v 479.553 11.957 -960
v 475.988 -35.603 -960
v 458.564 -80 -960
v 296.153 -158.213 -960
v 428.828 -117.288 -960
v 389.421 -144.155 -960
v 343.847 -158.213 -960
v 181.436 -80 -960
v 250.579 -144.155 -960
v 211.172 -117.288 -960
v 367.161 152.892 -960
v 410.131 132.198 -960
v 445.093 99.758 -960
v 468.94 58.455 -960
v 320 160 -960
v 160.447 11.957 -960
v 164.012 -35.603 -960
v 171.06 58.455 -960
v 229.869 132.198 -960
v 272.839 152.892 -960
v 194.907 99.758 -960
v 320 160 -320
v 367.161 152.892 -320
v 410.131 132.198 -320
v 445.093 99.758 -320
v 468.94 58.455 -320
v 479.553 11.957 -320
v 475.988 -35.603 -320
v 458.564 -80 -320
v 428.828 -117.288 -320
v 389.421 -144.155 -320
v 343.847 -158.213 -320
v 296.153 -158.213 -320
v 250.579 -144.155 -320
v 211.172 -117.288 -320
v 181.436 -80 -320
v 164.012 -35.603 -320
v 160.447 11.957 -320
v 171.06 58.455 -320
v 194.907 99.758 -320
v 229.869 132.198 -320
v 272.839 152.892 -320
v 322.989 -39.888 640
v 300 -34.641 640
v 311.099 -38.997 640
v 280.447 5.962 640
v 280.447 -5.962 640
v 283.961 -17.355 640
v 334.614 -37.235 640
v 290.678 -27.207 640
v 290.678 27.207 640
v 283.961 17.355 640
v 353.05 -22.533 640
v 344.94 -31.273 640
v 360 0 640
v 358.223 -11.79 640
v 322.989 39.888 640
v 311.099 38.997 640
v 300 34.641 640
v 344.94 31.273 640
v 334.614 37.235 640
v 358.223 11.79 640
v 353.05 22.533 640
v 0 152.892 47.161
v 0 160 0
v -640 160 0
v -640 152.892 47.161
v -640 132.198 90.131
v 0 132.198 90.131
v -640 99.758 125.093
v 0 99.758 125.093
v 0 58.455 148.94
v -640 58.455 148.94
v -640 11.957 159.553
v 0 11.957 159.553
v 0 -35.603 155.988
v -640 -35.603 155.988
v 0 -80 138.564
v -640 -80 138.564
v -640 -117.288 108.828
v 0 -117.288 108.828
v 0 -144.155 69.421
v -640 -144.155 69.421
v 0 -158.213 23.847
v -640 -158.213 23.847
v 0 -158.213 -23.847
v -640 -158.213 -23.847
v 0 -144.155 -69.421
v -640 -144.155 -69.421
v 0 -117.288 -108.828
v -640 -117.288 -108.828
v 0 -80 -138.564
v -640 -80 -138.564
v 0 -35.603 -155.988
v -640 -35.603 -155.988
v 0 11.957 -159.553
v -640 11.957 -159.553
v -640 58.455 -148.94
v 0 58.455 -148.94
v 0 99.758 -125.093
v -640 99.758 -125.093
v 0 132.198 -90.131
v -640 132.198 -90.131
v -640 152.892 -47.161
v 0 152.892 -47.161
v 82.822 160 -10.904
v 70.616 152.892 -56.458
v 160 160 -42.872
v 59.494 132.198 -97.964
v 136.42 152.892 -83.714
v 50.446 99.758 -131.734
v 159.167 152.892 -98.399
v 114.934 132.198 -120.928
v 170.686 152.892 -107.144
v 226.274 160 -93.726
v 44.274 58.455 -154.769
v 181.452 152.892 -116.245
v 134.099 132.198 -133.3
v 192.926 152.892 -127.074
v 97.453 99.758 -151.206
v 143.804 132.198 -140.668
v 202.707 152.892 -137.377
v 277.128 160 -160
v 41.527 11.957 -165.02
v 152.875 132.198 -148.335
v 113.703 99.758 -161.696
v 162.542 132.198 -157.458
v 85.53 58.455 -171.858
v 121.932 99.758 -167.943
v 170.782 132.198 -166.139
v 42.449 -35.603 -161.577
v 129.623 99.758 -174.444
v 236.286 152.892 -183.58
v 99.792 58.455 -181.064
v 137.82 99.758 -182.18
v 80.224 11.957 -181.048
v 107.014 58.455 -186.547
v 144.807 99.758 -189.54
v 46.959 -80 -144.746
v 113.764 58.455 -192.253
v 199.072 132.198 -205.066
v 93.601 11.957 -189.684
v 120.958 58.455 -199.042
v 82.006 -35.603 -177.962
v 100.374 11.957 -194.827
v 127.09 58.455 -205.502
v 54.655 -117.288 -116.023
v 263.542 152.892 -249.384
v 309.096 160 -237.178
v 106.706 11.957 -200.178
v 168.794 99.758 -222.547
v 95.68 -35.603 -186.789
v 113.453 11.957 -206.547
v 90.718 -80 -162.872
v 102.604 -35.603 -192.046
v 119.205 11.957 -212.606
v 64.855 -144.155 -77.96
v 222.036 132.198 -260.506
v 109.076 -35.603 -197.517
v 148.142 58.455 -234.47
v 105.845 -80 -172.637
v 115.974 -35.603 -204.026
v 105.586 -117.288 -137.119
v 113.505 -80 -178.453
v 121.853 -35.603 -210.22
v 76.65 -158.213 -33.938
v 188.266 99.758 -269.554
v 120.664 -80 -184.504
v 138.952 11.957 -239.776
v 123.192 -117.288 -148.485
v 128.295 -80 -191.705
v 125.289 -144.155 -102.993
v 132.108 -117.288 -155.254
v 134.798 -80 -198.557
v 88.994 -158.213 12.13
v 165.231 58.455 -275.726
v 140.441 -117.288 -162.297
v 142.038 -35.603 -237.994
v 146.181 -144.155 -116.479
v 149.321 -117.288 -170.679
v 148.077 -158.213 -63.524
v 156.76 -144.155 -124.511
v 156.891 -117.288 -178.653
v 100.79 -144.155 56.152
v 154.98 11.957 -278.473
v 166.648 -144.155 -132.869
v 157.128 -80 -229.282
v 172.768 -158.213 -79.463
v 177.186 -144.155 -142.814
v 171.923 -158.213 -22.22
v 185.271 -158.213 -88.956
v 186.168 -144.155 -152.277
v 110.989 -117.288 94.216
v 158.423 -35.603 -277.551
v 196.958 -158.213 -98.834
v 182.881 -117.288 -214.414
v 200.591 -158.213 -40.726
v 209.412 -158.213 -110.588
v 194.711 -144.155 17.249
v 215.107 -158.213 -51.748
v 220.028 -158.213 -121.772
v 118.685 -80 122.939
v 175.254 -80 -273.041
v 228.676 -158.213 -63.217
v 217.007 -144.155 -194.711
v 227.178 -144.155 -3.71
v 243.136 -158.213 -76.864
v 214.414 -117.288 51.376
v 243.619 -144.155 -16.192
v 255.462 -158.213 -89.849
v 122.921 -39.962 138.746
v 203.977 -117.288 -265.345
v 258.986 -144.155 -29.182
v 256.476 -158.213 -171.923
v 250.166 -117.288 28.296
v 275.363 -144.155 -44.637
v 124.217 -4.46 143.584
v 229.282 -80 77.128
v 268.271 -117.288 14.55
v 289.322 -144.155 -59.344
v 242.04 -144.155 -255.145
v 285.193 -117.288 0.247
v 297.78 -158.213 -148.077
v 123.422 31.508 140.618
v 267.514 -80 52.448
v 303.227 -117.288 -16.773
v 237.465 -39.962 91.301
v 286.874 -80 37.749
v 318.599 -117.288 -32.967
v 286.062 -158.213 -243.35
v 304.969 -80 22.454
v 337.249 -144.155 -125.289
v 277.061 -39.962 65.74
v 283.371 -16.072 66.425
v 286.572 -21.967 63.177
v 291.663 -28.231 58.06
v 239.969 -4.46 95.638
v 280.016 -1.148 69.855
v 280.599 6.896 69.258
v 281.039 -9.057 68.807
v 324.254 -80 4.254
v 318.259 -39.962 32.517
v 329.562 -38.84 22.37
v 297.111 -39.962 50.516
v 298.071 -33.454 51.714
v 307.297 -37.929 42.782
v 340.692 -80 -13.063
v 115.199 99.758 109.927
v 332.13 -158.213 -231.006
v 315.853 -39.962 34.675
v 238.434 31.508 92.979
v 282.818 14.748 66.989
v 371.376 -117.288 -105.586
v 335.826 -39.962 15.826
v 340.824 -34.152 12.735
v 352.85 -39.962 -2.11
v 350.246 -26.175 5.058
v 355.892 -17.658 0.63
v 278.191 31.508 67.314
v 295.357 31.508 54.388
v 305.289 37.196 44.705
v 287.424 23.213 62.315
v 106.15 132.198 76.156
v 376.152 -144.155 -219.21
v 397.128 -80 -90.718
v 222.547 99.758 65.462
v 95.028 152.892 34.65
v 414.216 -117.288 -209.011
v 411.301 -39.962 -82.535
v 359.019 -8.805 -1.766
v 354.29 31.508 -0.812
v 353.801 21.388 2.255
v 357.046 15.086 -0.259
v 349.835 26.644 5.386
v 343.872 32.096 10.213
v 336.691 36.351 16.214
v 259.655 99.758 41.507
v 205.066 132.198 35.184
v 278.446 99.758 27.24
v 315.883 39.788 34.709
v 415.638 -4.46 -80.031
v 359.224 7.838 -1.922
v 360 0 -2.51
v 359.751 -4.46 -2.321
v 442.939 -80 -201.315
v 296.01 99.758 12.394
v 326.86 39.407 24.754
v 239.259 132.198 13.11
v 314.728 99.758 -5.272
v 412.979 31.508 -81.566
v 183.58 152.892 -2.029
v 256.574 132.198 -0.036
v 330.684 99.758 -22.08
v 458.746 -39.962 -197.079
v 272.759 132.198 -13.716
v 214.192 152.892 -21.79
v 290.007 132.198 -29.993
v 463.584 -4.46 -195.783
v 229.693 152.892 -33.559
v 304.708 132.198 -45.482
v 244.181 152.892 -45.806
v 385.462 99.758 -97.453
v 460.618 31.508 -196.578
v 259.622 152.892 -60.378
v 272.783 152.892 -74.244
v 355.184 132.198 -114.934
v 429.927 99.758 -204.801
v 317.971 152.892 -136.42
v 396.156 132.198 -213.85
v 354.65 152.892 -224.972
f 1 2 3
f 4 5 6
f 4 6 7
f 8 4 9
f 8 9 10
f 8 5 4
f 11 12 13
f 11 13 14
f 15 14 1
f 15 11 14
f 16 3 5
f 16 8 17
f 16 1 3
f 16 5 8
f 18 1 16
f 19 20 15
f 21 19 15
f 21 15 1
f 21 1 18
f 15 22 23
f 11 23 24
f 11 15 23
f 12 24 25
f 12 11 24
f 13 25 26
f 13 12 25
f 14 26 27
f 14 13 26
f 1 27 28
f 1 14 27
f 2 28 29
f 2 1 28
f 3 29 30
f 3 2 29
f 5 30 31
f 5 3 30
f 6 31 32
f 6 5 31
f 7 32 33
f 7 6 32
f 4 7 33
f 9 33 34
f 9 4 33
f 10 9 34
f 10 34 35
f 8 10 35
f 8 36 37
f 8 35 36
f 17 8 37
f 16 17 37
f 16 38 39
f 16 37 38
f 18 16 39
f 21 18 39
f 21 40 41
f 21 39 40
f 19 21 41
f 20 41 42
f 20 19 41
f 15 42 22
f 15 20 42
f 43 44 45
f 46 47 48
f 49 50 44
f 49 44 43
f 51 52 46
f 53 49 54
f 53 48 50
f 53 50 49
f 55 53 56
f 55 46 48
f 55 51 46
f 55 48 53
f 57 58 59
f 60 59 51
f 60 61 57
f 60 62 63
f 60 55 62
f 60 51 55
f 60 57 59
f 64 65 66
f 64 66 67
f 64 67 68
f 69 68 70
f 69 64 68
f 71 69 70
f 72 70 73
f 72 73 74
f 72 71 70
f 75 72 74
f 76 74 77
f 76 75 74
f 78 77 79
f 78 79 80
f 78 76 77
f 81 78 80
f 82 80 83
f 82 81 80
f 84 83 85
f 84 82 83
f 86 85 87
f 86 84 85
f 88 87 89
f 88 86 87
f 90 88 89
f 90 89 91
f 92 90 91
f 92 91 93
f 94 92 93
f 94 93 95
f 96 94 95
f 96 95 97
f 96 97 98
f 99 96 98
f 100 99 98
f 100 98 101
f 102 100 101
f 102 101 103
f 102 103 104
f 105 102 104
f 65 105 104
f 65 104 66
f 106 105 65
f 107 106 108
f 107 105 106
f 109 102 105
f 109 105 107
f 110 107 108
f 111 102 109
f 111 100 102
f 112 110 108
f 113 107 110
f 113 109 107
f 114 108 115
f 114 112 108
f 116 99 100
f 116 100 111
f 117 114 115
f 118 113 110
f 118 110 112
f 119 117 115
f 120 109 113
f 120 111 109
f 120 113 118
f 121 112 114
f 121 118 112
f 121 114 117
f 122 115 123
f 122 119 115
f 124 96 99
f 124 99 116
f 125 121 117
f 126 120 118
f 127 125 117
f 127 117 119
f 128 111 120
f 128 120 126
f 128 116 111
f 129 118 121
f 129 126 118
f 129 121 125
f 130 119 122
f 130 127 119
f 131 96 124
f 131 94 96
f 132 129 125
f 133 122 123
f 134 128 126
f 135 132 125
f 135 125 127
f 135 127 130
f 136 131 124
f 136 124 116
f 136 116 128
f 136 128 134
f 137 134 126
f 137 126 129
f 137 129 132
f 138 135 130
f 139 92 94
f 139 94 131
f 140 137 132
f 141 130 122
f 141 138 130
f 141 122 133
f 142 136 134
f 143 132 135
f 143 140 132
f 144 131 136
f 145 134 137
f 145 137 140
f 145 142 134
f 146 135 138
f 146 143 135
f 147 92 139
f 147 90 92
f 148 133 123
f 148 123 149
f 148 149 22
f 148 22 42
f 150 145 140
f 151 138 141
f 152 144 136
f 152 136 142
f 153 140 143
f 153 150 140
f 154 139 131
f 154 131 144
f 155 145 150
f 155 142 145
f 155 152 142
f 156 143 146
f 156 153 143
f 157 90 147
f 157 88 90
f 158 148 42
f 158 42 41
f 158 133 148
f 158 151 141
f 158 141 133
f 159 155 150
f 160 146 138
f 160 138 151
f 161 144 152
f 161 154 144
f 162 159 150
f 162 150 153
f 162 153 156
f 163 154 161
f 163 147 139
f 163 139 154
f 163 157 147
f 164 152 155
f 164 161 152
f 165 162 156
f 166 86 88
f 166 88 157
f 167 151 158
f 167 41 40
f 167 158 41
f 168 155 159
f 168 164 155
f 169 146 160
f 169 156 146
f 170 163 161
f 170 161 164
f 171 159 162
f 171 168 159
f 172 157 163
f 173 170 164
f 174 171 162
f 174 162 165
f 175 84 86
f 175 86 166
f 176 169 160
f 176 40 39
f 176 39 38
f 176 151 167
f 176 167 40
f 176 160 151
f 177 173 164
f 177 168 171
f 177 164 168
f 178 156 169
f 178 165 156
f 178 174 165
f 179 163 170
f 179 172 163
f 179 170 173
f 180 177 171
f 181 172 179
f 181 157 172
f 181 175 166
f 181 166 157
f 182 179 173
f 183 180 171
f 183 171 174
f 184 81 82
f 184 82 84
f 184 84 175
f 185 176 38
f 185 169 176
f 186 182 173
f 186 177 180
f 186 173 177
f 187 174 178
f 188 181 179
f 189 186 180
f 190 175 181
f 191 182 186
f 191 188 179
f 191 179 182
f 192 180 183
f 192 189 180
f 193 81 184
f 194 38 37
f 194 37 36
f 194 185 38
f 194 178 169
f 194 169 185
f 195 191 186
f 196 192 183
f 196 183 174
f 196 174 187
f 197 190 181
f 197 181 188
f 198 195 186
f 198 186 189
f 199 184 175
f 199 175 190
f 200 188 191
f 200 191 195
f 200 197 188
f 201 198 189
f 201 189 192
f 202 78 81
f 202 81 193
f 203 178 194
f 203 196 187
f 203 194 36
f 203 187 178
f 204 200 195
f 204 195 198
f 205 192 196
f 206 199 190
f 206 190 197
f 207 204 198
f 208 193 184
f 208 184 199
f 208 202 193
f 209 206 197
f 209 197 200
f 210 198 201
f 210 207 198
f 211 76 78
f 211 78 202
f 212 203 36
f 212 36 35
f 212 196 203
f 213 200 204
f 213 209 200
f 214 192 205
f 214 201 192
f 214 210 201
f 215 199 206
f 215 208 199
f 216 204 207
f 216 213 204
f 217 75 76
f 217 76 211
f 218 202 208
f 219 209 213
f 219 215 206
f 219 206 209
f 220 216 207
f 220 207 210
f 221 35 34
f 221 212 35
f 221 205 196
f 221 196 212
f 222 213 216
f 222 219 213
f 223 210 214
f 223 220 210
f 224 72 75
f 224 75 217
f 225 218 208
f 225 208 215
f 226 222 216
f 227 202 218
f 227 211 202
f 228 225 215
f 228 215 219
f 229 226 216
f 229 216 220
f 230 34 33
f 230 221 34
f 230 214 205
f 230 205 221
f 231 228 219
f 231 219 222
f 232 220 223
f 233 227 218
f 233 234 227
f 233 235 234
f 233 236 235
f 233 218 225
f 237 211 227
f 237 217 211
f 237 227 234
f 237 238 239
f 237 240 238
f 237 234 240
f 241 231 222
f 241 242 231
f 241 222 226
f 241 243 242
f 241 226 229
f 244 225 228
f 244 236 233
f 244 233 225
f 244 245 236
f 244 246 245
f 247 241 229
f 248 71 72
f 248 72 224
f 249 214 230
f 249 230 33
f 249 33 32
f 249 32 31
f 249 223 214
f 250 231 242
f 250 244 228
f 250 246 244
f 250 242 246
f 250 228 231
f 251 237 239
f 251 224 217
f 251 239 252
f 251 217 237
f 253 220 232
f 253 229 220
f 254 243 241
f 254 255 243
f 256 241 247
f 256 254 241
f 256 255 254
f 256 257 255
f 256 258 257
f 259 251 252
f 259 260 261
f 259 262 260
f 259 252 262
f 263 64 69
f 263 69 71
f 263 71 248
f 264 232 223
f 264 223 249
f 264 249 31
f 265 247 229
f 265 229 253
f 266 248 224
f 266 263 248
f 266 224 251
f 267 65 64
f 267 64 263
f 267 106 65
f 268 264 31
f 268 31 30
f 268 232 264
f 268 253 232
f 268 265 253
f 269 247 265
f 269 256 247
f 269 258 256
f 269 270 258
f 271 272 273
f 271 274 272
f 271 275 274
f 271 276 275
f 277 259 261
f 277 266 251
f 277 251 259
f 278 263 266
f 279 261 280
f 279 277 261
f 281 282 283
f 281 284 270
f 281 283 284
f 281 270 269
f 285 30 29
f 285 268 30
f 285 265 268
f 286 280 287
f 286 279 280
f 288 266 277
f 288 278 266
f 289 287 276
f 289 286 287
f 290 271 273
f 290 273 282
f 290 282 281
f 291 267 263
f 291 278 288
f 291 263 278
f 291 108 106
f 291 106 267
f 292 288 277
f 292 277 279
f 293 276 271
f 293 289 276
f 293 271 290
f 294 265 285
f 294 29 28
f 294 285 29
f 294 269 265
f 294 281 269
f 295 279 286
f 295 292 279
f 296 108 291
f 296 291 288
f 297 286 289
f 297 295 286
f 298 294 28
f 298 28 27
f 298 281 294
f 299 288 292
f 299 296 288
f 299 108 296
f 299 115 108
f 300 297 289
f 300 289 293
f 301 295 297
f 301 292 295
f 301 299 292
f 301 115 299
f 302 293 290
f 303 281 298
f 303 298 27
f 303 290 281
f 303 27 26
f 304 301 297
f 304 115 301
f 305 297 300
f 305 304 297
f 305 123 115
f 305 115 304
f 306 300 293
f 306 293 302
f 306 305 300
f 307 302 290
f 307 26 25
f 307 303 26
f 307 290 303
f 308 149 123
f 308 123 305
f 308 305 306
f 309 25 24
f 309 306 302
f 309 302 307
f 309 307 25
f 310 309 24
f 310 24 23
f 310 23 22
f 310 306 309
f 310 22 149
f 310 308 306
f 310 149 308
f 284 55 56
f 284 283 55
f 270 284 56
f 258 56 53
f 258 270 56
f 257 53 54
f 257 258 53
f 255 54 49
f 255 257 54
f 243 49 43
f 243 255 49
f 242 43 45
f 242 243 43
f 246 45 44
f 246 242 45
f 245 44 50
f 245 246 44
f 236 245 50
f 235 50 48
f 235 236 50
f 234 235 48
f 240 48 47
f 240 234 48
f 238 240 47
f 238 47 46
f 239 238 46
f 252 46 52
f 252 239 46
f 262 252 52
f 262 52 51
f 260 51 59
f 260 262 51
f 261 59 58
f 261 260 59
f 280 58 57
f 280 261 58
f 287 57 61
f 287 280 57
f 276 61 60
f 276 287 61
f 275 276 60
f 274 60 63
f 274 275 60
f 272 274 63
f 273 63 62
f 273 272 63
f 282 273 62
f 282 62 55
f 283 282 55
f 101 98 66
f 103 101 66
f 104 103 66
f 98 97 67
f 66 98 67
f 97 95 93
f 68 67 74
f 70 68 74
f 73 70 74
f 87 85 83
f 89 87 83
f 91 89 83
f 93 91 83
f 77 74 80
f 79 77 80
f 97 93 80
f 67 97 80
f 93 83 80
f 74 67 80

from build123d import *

# Parameters (mm, degrees)
F1_R = 160
F4_R = 40


with BuildPart() as f2:
    # F2: sweep along a path in F0
    with BuildLine(Plane.XZ) as f2_path:
        Line((-640, 0), (0, 0))
        ThreePointArc((0, 0), (226.2741699797, -93.7258300203), (320, -320))
        Line((320, -320), (320, -960))
    # F1 (on Right) → F2 (sweep)
    with BuildSketch(Plane.YZ):
        Circle(F1_R)
    sweep(path=f2_path.line)

    # F5: sweep along a path in F3
    with BuildLine(Plane.XZ) as f5_path:
        Line((320, 640), (320, -183.2472234964))
    # F4 (on Top) → F5 (sweep)
    with BuildSketch(Plane.XY):
        with Locations((320, 0)):
            Circle(F4_R)
    sweep(path=f5_path.line)


solid = f2.part
